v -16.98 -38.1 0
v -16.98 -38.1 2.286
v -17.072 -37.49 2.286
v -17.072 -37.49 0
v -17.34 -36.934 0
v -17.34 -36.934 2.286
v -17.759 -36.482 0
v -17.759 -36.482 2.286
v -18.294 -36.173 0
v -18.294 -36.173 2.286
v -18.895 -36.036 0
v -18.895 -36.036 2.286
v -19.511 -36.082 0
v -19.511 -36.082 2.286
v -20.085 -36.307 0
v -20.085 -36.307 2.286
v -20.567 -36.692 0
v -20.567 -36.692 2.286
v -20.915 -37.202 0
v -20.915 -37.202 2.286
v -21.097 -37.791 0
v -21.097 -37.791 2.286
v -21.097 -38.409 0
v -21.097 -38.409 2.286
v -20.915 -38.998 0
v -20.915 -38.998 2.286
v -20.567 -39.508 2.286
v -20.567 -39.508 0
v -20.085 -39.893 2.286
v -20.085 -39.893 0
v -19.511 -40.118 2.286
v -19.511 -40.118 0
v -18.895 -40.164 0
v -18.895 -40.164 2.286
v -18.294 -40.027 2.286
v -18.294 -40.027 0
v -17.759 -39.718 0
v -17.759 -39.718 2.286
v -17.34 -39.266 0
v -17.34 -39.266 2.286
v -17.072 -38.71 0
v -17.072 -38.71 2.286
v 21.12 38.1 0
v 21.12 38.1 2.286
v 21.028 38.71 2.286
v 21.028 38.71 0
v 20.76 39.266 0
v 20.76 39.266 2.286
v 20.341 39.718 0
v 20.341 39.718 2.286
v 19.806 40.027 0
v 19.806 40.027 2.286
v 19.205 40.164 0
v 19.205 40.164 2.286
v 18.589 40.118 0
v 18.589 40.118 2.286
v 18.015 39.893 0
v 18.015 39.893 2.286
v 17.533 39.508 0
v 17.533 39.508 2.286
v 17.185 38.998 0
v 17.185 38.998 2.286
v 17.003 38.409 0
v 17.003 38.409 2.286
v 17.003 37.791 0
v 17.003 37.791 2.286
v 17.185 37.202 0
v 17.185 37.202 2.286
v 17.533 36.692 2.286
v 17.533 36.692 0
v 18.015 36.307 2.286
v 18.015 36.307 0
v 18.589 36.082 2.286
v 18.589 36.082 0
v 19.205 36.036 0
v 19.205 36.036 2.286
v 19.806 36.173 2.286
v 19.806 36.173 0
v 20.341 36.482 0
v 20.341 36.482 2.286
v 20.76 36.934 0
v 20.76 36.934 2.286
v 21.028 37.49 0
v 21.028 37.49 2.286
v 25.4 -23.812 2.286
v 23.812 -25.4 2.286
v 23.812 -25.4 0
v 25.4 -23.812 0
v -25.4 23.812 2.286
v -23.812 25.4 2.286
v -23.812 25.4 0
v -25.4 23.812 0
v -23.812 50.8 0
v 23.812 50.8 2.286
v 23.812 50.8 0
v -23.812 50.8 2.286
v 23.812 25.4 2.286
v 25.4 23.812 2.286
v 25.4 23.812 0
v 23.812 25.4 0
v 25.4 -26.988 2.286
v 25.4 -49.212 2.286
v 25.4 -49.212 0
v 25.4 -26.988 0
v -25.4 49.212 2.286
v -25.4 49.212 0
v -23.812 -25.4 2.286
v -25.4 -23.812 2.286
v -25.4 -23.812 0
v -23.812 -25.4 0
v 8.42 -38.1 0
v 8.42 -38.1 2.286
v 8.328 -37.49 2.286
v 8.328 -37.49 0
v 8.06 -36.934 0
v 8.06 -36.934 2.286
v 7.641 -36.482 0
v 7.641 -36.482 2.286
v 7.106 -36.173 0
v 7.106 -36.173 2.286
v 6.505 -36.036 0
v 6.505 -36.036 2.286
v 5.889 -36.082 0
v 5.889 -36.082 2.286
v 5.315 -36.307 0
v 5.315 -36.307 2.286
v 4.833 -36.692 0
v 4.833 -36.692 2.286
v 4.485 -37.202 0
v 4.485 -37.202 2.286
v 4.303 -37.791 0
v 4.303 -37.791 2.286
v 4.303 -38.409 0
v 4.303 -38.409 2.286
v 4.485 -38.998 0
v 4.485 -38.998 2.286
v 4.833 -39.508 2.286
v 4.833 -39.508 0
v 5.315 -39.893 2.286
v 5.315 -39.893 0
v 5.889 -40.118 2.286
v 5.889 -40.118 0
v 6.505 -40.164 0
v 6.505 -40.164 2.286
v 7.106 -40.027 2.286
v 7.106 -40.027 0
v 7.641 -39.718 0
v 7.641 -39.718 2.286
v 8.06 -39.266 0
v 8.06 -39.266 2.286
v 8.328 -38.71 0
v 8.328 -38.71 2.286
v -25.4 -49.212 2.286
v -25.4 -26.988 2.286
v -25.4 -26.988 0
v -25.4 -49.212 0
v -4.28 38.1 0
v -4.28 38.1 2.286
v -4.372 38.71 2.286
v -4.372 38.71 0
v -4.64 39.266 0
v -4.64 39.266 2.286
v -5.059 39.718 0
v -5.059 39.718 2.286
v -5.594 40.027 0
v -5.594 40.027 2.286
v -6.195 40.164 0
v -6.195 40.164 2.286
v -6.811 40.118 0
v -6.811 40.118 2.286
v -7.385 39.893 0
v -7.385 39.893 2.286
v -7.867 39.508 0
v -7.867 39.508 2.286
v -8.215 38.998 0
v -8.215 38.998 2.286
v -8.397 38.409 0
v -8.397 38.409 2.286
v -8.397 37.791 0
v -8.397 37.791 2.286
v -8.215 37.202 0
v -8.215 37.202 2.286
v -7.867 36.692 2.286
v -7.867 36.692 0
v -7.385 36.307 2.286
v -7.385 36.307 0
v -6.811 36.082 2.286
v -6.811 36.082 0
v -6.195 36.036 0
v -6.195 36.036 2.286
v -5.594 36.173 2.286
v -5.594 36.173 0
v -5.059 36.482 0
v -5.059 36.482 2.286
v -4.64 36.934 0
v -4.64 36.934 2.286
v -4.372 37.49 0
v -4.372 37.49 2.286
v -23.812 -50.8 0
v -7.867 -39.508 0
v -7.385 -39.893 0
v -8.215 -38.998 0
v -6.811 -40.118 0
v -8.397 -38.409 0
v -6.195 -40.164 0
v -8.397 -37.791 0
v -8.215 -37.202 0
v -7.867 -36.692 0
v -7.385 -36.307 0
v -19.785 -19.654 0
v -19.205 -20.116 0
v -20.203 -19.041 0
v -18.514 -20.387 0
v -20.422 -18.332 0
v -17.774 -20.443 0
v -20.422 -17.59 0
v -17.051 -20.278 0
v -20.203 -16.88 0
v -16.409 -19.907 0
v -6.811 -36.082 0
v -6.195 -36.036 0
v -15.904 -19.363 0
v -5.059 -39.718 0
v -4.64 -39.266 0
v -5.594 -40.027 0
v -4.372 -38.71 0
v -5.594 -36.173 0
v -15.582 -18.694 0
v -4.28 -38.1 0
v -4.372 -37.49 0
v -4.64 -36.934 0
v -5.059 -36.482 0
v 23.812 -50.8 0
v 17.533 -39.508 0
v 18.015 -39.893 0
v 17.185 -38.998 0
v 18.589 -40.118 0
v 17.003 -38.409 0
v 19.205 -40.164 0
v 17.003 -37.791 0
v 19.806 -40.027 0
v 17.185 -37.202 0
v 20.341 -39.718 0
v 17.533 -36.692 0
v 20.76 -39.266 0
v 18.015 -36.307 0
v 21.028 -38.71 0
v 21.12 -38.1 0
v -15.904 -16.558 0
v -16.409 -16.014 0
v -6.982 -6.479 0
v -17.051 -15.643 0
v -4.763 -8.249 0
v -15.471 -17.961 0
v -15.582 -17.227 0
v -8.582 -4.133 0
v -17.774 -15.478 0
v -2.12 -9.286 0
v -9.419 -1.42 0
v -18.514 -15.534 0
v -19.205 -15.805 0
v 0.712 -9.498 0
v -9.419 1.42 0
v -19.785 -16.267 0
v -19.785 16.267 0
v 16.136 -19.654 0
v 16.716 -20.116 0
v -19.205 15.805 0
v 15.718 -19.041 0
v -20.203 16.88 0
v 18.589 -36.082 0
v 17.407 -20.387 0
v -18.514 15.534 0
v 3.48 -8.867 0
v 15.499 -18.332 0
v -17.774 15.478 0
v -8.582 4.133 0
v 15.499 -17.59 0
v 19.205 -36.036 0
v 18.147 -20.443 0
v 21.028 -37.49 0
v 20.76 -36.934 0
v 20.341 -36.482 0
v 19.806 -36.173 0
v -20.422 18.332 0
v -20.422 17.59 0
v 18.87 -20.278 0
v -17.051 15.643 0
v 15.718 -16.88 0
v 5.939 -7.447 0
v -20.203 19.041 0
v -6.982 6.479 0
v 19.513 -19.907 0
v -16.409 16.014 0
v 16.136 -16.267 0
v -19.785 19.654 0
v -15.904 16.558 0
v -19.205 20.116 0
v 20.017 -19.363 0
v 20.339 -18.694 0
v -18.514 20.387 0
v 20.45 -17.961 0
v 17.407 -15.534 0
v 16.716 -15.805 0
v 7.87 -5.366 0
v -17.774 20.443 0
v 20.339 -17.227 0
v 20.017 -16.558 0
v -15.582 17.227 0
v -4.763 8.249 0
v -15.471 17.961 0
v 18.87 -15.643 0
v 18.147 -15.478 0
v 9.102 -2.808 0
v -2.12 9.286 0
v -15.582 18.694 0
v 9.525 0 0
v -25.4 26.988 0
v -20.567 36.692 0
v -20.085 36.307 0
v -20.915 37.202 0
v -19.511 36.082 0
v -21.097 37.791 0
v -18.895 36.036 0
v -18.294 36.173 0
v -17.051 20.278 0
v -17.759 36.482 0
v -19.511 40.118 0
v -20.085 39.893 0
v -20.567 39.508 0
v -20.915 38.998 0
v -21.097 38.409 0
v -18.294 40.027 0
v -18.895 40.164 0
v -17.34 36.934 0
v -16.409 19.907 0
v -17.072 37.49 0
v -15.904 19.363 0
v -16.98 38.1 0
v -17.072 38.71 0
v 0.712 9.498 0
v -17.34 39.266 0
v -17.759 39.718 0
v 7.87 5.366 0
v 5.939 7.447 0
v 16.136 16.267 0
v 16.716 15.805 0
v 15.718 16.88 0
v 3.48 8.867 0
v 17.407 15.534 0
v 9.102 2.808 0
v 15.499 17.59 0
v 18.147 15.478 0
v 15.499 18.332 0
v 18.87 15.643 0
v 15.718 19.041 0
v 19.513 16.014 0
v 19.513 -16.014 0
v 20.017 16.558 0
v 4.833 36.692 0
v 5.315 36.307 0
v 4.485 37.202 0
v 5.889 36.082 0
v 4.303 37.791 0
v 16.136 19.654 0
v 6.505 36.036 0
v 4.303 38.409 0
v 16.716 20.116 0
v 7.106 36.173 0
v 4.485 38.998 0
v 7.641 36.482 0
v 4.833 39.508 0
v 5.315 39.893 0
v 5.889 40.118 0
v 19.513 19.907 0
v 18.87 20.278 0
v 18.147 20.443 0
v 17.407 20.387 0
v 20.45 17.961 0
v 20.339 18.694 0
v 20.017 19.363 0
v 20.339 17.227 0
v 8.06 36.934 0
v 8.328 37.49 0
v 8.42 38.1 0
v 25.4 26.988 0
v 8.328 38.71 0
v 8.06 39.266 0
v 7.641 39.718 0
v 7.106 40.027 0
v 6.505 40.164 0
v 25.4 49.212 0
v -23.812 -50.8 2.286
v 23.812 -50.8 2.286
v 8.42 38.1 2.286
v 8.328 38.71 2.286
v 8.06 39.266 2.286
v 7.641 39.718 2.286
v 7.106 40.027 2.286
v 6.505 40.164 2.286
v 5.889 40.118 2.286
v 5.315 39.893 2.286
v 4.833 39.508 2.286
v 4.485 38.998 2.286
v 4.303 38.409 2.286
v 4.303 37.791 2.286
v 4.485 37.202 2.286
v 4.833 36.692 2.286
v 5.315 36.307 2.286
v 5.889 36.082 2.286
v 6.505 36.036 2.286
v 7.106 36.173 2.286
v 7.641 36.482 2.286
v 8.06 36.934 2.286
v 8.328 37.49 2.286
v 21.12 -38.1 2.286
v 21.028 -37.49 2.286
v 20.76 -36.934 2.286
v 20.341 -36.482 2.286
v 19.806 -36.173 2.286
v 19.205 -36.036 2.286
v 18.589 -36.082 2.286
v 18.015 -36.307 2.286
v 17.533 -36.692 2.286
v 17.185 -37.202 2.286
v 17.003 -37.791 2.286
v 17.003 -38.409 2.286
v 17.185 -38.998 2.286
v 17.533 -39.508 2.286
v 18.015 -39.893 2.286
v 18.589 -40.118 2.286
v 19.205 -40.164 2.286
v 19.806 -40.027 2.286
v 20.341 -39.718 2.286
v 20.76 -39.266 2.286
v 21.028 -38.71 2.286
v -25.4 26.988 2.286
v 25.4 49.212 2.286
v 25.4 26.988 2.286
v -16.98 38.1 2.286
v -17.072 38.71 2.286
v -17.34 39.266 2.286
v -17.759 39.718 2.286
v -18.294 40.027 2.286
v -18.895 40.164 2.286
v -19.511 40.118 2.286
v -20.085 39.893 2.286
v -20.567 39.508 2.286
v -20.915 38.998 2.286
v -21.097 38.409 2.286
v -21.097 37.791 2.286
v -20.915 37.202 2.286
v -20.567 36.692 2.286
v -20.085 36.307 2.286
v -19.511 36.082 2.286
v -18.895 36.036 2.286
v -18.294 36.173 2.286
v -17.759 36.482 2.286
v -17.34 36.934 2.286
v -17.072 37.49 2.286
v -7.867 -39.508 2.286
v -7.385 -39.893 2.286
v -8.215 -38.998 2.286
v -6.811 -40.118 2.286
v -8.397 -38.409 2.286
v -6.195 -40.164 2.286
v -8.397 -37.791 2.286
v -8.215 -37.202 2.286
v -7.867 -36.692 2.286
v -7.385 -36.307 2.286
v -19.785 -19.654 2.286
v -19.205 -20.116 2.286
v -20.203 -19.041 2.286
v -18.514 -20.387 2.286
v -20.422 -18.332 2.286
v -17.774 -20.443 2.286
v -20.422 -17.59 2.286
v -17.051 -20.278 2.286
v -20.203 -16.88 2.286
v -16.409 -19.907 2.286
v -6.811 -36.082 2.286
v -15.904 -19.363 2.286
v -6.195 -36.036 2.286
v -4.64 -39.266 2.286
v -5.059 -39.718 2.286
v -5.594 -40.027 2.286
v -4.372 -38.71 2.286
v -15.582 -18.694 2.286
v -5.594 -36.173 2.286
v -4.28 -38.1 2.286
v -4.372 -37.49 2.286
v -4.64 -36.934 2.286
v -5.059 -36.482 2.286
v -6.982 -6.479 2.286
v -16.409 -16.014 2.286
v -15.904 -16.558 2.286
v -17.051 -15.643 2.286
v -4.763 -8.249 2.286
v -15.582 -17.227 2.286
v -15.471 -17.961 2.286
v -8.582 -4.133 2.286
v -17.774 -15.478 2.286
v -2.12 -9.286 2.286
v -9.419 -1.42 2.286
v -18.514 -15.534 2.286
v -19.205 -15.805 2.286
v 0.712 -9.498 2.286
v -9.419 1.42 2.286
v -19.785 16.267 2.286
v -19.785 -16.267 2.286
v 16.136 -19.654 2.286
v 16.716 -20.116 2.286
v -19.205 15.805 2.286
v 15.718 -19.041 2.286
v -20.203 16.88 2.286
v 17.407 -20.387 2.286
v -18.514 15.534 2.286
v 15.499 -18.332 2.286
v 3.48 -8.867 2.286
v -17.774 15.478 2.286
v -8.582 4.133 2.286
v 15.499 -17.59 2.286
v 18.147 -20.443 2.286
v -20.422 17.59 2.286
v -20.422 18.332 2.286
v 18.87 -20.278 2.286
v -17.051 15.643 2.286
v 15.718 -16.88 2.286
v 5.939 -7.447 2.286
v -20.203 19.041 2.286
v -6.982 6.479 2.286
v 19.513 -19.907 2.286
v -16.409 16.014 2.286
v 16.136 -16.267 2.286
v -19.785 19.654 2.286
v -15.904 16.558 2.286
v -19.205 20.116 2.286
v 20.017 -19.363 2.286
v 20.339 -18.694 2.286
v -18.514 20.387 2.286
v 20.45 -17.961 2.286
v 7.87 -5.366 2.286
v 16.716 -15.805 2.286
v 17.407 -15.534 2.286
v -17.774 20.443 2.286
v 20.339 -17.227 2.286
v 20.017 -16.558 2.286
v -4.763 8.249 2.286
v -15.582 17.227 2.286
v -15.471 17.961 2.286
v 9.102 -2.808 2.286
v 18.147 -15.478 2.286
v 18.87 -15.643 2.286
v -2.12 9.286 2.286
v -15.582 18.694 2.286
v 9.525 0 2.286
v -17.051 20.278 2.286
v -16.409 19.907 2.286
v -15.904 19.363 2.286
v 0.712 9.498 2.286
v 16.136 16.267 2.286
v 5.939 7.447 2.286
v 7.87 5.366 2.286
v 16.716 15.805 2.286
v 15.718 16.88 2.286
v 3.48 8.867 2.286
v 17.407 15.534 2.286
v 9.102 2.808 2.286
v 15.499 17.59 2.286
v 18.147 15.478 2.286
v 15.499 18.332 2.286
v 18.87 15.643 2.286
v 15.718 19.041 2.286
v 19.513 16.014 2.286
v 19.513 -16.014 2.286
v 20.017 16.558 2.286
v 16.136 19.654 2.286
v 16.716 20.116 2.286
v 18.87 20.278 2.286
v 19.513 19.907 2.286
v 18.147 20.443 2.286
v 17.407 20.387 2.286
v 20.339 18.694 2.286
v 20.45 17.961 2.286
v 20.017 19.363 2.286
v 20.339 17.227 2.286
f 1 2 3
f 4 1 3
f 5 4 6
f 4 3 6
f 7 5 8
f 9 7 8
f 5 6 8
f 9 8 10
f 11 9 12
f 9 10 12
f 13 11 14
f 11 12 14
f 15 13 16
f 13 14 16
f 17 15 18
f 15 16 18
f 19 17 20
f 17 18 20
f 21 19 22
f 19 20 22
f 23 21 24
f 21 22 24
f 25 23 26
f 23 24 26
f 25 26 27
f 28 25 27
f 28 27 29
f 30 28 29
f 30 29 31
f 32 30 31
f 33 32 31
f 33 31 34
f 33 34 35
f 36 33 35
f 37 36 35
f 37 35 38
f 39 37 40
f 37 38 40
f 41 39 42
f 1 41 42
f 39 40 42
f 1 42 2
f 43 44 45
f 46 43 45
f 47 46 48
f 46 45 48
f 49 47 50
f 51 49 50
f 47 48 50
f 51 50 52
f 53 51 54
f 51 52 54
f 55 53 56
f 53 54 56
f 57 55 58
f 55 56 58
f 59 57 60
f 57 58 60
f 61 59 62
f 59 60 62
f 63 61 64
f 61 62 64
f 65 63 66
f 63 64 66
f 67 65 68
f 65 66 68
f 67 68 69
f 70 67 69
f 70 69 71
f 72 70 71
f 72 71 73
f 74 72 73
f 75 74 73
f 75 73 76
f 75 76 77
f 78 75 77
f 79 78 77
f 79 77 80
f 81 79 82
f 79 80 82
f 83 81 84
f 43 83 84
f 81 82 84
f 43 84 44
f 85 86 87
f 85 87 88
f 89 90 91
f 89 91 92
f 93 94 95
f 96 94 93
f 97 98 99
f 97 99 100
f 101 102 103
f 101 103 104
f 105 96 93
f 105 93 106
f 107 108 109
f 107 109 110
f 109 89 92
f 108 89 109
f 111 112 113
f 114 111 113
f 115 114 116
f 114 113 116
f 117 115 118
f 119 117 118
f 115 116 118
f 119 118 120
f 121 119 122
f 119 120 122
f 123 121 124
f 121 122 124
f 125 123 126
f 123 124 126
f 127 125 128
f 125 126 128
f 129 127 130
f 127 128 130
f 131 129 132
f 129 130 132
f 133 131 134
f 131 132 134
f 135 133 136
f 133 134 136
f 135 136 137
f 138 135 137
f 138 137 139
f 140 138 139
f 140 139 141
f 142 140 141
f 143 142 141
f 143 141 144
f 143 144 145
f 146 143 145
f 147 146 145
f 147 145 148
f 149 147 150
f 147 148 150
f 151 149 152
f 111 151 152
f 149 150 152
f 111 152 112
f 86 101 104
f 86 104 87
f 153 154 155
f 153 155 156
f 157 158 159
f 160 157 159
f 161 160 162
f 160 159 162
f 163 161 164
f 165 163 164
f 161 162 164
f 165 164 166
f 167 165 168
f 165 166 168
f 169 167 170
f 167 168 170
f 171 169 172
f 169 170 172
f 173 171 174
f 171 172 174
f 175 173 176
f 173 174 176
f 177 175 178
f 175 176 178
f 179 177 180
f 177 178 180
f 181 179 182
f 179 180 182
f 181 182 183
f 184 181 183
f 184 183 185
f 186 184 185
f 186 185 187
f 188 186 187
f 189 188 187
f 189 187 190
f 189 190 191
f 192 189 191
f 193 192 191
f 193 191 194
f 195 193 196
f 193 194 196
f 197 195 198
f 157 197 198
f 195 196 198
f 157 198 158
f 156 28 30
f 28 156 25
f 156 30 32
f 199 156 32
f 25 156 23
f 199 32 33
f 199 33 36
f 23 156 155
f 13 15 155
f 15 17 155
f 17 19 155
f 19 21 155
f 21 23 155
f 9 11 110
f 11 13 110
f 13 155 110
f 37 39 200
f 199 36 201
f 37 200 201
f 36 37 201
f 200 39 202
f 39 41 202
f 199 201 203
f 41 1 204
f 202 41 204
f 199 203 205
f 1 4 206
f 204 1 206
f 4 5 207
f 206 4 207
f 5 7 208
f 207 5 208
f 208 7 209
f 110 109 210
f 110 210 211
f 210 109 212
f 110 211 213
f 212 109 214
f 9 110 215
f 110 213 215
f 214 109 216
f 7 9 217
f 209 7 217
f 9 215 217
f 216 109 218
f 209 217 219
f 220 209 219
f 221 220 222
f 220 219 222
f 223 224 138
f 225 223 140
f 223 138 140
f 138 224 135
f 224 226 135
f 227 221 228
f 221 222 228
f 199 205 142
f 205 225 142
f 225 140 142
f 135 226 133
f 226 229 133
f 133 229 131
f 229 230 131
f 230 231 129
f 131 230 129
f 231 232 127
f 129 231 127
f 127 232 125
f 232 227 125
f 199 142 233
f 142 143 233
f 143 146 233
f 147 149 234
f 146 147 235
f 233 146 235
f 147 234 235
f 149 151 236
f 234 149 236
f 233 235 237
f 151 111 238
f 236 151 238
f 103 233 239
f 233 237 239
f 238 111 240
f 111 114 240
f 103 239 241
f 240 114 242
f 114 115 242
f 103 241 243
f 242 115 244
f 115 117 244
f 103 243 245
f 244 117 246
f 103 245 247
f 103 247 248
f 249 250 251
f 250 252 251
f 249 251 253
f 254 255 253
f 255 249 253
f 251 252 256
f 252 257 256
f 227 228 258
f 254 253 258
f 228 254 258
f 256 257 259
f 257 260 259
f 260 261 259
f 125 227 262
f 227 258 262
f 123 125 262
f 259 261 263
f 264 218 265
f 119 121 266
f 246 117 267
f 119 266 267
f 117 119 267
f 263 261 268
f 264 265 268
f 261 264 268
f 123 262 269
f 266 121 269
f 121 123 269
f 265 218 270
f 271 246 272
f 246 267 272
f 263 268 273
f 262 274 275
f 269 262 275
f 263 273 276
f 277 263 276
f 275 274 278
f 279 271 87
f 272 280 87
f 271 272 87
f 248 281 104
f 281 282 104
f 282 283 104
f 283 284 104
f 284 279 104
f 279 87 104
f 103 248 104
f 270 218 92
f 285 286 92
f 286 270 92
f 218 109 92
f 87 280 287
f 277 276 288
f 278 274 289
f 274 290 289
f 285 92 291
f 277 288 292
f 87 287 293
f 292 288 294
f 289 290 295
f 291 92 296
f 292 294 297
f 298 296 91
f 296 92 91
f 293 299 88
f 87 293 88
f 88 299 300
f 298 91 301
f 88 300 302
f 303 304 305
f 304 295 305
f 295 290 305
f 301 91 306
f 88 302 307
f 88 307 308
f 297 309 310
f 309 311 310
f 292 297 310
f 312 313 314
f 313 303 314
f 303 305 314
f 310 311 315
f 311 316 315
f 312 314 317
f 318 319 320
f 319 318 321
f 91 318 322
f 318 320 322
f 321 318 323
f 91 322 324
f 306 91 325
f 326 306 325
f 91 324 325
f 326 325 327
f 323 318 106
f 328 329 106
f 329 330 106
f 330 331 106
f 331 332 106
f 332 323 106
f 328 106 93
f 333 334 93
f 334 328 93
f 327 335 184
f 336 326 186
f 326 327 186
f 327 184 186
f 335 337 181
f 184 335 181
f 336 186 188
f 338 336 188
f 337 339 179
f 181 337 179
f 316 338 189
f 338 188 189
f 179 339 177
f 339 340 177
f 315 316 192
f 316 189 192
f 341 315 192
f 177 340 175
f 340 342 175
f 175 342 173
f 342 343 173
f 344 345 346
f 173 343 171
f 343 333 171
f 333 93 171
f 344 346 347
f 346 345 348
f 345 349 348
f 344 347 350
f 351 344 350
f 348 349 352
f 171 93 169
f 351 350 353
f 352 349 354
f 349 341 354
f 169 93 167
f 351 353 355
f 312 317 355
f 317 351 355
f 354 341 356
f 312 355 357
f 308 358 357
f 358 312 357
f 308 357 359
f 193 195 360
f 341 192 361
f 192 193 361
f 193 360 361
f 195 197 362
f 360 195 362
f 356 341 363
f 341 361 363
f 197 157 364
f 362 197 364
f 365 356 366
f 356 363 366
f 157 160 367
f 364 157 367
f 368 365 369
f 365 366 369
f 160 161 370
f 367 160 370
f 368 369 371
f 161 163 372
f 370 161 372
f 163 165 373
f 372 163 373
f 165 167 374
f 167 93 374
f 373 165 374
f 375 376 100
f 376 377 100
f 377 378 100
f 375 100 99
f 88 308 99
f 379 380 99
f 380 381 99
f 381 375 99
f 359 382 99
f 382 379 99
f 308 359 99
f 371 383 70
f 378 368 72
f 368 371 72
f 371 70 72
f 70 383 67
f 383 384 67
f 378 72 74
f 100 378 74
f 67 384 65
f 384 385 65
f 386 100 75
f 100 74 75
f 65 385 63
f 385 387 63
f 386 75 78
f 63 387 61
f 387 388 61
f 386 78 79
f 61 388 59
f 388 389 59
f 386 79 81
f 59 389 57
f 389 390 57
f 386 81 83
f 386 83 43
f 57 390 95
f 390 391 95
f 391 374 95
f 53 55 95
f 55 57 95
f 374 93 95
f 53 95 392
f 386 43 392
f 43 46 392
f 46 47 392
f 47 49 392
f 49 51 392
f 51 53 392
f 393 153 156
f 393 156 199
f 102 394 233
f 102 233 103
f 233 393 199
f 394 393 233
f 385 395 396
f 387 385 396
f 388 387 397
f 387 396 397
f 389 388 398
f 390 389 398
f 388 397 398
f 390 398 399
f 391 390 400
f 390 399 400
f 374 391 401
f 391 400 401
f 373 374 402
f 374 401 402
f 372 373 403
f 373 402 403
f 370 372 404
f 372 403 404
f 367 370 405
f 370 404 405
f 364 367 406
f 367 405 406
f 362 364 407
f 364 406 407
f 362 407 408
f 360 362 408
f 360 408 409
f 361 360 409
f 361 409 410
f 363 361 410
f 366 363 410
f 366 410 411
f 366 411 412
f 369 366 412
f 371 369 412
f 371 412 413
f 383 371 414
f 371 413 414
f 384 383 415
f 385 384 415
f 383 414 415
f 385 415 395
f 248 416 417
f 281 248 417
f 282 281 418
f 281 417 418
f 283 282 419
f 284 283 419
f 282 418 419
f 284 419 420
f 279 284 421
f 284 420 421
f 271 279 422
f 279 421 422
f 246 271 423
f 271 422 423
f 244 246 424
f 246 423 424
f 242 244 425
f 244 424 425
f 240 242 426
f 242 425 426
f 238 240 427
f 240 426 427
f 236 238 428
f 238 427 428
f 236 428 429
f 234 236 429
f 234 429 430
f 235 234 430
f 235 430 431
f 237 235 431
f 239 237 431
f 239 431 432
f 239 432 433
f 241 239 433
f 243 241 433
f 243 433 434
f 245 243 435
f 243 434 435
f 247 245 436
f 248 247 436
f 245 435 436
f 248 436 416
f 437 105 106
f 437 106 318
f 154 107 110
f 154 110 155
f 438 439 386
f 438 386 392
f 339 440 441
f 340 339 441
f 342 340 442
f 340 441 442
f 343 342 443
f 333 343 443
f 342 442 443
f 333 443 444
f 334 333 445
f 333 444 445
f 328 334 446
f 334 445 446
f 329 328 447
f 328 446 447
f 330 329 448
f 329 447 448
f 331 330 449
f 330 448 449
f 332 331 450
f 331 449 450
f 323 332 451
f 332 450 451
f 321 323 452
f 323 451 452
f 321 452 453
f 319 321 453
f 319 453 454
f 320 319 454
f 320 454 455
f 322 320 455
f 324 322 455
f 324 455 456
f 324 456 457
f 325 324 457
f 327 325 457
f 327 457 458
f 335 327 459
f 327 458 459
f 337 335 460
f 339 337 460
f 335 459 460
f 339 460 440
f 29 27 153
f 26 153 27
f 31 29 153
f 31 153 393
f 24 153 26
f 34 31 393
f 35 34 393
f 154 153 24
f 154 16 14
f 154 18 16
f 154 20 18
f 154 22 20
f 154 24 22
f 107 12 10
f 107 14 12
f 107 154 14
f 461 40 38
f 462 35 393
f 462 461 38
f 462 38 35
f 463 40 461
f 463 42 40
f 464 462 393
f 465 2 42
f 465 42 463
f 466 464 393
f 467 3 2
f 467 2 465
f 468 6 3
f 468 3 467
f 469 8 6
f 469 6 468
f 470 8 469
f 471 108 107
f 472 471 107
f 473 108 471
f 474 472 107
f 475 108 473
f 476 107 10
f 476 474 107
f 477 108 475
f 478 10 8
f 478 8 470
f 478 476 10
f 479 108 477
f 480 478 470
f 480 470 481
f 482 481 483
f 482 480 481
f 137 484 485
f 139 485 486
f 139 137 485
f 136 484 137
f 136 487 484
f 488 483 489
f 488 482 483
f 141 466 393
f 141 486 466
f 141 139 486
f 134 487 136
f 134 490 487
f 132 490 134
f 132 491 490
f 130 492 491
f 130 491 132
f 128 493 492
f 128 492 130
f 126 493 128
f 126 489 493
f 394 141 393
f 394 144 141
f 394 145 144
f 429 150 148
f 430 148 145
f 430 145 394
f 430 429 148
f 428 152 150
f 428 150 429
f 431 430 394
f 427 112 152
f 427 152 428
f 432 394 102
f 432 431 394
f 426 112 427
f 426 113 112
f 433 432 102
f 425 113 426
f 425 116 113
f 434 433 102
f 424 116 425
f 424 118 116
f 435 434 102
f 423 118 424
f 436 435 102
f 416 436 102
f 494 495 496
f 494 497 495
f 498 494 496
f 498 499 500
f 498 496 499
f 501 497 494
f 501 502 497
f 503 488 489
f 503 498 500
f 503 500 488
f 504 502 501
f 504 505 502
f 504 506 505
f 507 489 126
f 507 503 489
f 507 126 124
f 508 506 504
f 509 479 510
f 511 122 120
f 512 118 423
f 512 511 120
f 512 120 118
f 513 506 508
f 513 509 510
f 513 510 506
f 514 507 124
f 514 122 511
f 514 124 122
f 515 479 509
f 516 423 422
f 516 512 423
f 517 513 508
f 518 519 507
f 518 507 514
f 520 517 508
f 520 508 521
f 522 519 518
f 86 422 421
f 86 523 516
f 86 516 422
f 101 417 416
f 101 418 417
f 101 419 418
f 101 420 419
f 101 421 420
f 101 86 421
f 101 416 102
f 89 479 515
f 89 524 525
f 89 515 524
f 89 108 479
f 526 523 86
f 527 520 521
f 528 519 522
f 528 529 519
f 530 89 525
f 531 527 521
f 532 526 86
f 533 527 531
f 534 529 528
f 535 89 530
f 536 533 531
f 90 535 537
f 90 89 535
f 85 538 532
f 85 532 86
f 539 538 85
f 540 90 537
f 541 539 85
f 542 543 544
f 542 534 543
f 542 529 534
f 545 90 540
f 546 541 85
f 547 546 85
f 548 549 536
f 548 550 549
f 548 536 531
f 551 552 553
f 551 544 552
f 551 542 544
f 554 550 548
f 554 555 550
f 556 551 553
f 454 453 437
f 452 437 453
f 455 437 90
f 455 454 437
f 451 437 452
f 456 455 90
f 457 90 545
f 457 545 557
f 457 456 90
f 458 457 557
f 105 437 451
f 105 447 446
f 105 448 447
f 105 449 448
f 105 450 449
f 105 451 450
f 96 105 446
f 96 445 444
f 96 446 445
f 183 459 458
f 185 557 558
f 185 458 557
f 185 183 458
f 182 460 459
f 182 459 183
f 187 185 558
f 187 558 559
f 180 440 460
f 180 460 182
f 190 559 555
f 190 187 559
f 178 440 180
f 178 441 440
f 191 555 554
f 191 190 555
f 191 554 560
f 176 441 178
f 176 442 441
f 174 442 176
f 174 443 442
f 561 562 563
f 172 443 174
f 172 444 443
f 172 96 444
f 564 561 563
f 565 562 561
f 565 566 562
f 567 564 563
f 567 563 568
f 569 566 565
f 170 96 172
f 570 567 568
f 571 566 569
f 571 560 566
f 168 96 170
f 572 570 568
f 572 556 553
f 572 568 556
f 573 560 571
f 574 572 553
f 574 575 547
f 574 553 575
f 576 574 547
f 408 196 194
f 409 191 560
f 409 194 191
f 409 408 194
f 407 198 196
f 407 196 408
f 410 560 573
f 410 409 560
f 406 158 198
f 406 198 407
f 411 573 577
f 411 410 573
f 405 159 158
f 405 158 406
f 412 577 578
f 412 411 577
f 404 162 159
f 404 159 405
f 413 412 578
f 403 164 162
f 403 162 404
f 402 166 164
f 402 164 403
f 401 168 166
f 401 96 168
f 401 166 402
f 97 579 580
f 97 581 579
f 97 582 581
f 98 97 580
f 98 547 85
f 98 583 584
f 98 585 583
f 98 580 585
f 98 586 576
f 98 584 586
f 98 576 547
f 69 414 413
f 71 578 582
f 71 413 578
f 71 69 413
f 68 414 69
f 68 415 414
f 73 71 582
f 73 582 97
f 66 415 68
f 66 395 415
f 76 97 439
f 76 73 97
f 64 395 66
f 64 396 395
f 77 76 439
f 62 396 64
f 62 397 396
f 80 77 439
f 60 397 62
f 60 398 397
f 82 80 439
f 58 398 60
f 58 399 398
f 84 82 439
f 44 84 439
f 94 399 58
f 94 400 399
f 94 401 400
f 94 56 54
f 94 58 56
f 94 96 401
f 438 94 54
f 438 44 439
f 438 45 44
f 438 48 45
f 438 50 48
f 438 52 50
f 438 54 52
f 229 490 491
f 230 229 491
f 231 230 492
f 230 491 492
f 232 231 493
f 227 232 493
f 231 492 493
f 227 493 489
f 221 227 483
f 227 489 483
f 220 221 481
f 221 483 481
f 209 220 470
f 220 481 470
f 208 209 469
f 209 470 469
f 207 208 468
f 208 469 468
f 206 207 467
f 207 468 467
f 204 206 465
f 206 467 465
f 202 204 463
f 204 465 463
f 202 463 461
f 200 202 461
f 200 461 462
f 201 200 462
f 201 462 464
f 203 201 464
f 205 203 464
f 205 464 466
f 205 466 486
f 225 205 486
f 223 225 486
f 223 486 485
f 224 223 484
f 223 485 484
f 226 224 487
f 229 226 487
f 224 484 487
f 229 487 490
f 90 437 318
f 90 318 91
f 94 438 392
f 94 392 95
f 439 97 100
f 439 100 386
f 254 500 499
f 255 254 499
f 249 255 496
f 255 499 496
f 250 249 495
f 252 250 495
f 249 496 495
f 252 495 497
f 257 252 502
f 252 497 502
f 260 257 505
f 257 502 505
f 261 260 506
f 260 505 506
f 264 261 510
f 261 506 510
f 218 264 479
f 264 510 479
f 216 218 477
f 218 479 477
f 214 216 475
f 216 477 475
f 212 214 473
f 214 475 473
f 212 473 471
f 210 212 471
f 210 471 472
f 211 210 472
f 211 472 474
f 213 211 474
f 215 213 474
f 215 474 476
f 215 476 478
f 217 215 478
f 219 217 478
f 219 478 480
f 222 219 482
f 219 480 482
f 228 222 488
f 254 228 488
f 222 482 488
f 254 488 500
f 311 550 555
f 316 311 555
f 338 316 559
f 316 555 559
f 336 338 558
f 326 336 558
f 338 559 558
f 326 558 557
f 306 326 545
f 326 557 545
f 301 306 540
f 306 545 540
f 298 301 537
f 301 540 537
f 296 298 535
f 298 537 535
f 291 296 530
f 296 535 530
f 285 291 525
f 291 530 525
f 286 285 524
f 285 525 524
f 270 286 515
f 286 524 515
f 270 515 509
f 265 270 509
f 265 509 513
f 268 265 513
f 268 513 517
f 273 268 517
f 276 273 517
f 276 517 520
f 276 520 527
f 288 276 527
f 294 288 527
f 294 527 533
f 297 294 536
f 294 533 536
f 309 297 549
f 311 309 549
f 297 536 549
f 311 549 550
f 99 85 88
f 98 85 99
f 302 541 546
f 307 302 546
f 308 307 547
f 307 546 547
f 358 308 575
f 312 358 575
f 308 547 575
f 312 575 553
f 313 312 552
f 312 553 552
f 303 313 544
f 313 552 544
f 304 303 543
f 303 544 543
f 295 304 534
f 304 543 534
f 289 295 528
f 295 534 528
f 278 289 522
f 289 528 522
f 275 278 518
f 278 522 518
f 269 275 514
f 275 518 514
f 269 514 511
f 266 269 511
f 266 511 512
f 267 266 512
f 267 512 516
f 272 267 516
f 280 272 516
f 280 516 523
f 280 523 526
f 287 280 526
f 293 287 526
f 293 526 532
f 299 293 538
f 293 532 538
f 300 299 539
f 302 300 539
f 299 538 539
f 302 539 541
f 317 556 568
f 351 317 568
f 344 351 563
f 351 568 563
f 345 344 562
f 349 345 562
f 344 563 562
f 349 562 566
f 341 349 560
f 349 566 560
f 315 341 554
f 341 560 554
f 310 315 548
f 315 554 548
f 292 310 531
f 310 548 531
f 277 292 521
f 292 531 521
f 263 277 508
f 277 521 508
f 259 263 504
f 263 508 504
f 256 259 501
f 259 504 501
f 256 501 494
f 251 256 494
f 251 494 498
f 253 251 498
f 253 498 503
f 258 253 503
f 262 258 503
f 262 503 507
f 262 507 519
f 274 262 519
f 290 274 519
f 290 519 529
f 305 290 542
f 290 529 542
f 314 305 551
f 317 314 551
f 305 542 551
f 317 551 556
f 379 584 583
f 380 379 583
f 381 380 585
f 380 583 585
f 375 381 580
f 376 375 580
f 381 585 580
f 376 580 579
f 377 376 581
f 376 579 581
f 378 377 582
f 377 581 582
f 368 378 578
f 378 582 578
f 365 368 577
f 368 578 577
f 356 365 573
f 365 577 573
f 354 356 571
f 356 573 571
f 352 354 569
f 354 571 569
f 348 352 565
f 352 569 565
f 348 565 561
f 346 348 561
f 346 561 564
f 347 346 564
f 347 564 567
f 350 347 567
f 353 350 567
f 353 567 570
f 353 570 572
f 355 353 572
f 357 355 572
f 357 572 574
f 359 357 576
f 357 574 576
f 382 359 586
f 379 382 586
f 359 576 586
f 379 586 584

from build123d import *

# Parameters (mm, degrees)
SKETCH1_R           = 2.4892
SKETCH1_R_2         = 2.0701
SKETCH1_R_3         = 9.525
BOSS_EXTRUDE1_DEPTH = 2.286


with BuildPart() as part:
    # Sketch1 → Boss-Extrude1 (new body)
    with BuildSketch(Plane.XY.offset(2.286)):
        Polygon((25.4, -26.9875), (23.8125, -25.4), (25.4, -23.8125), (25.4, 23.8125), (23.8125, 25.4), (25.4, 26.9875), (25.4, 49.2125), (23.8125, 50.8), (-23.8125, 50.8), (-25.4, 49.2125), (-25.4, 26.9875), (-23.8125, 25.4), (-25.4, 23.8125), (-25.4, -23.8125), (-23.8125, -25.4), (-25.4, -26.9875), (-25.4, -49.2125), (-23.8125, -50.8), (23.8125, -50.8), (25.4, -49.2125), align=None)
        with Locations((-17.960512242, -17.960512242)):
            Circle(SKETCH1_R, mode=Mode.SUBTRACT)
        with Locations((-19.05, -38.1)):
            Circle(SKETCH1_R_2, mode=Mode.SUBTRACT)
        with Locations((-6.35, -38.1)):
            Circle(SKETCH1_R_2, mode=Mode.SUBTRACT)
        with Locations((19.05, -38.1)):
            Circle(SKETCH1_R_2, mode=Mode.SUBTRACT)
        Circle(SKETCH1_R_3, mode=Mode.SUBTRACT)
        with Locations((6.35, 38.1)):
            Circle(SKETCH1_R_2, mode=Mode.SUBTRACT)
        with Locations((-19.05, 38.1)):
            Circle(SKETCH1_R_2, mode=Mode.SUBTRACT)
        with Locations((-6.35, 38.1)):
            Circle(SKETCH1_R_2, mode=Mode.SUBTRACT)
        with Locations((19.05, 38.1)):
            Circle(SKETCH1_R_2, mode=Mode.SUBTRACT)
        with Locations((-17.960512242, 17.960512242)):
            Circle(SKETCH1_R, mode=Mode.SUBTRACT)
        with Locations((6.35, -38.1)):
            Circle(SKETCH1_R_2, mode=Mode.SUBTRACT)
        with Locations((17.960512242, -17.960512242)):
            Circle(SKETCH1_R, mode=Mode.SUBTRACT)
        with Locations((17.960512242, 17.960512242)):
            Circle(SKETCH1_R, mode=Mode.SUBTRACT)
    extrude(amount=-BOSS_EXTRUDE1_DEPTH)


solid = part.part
